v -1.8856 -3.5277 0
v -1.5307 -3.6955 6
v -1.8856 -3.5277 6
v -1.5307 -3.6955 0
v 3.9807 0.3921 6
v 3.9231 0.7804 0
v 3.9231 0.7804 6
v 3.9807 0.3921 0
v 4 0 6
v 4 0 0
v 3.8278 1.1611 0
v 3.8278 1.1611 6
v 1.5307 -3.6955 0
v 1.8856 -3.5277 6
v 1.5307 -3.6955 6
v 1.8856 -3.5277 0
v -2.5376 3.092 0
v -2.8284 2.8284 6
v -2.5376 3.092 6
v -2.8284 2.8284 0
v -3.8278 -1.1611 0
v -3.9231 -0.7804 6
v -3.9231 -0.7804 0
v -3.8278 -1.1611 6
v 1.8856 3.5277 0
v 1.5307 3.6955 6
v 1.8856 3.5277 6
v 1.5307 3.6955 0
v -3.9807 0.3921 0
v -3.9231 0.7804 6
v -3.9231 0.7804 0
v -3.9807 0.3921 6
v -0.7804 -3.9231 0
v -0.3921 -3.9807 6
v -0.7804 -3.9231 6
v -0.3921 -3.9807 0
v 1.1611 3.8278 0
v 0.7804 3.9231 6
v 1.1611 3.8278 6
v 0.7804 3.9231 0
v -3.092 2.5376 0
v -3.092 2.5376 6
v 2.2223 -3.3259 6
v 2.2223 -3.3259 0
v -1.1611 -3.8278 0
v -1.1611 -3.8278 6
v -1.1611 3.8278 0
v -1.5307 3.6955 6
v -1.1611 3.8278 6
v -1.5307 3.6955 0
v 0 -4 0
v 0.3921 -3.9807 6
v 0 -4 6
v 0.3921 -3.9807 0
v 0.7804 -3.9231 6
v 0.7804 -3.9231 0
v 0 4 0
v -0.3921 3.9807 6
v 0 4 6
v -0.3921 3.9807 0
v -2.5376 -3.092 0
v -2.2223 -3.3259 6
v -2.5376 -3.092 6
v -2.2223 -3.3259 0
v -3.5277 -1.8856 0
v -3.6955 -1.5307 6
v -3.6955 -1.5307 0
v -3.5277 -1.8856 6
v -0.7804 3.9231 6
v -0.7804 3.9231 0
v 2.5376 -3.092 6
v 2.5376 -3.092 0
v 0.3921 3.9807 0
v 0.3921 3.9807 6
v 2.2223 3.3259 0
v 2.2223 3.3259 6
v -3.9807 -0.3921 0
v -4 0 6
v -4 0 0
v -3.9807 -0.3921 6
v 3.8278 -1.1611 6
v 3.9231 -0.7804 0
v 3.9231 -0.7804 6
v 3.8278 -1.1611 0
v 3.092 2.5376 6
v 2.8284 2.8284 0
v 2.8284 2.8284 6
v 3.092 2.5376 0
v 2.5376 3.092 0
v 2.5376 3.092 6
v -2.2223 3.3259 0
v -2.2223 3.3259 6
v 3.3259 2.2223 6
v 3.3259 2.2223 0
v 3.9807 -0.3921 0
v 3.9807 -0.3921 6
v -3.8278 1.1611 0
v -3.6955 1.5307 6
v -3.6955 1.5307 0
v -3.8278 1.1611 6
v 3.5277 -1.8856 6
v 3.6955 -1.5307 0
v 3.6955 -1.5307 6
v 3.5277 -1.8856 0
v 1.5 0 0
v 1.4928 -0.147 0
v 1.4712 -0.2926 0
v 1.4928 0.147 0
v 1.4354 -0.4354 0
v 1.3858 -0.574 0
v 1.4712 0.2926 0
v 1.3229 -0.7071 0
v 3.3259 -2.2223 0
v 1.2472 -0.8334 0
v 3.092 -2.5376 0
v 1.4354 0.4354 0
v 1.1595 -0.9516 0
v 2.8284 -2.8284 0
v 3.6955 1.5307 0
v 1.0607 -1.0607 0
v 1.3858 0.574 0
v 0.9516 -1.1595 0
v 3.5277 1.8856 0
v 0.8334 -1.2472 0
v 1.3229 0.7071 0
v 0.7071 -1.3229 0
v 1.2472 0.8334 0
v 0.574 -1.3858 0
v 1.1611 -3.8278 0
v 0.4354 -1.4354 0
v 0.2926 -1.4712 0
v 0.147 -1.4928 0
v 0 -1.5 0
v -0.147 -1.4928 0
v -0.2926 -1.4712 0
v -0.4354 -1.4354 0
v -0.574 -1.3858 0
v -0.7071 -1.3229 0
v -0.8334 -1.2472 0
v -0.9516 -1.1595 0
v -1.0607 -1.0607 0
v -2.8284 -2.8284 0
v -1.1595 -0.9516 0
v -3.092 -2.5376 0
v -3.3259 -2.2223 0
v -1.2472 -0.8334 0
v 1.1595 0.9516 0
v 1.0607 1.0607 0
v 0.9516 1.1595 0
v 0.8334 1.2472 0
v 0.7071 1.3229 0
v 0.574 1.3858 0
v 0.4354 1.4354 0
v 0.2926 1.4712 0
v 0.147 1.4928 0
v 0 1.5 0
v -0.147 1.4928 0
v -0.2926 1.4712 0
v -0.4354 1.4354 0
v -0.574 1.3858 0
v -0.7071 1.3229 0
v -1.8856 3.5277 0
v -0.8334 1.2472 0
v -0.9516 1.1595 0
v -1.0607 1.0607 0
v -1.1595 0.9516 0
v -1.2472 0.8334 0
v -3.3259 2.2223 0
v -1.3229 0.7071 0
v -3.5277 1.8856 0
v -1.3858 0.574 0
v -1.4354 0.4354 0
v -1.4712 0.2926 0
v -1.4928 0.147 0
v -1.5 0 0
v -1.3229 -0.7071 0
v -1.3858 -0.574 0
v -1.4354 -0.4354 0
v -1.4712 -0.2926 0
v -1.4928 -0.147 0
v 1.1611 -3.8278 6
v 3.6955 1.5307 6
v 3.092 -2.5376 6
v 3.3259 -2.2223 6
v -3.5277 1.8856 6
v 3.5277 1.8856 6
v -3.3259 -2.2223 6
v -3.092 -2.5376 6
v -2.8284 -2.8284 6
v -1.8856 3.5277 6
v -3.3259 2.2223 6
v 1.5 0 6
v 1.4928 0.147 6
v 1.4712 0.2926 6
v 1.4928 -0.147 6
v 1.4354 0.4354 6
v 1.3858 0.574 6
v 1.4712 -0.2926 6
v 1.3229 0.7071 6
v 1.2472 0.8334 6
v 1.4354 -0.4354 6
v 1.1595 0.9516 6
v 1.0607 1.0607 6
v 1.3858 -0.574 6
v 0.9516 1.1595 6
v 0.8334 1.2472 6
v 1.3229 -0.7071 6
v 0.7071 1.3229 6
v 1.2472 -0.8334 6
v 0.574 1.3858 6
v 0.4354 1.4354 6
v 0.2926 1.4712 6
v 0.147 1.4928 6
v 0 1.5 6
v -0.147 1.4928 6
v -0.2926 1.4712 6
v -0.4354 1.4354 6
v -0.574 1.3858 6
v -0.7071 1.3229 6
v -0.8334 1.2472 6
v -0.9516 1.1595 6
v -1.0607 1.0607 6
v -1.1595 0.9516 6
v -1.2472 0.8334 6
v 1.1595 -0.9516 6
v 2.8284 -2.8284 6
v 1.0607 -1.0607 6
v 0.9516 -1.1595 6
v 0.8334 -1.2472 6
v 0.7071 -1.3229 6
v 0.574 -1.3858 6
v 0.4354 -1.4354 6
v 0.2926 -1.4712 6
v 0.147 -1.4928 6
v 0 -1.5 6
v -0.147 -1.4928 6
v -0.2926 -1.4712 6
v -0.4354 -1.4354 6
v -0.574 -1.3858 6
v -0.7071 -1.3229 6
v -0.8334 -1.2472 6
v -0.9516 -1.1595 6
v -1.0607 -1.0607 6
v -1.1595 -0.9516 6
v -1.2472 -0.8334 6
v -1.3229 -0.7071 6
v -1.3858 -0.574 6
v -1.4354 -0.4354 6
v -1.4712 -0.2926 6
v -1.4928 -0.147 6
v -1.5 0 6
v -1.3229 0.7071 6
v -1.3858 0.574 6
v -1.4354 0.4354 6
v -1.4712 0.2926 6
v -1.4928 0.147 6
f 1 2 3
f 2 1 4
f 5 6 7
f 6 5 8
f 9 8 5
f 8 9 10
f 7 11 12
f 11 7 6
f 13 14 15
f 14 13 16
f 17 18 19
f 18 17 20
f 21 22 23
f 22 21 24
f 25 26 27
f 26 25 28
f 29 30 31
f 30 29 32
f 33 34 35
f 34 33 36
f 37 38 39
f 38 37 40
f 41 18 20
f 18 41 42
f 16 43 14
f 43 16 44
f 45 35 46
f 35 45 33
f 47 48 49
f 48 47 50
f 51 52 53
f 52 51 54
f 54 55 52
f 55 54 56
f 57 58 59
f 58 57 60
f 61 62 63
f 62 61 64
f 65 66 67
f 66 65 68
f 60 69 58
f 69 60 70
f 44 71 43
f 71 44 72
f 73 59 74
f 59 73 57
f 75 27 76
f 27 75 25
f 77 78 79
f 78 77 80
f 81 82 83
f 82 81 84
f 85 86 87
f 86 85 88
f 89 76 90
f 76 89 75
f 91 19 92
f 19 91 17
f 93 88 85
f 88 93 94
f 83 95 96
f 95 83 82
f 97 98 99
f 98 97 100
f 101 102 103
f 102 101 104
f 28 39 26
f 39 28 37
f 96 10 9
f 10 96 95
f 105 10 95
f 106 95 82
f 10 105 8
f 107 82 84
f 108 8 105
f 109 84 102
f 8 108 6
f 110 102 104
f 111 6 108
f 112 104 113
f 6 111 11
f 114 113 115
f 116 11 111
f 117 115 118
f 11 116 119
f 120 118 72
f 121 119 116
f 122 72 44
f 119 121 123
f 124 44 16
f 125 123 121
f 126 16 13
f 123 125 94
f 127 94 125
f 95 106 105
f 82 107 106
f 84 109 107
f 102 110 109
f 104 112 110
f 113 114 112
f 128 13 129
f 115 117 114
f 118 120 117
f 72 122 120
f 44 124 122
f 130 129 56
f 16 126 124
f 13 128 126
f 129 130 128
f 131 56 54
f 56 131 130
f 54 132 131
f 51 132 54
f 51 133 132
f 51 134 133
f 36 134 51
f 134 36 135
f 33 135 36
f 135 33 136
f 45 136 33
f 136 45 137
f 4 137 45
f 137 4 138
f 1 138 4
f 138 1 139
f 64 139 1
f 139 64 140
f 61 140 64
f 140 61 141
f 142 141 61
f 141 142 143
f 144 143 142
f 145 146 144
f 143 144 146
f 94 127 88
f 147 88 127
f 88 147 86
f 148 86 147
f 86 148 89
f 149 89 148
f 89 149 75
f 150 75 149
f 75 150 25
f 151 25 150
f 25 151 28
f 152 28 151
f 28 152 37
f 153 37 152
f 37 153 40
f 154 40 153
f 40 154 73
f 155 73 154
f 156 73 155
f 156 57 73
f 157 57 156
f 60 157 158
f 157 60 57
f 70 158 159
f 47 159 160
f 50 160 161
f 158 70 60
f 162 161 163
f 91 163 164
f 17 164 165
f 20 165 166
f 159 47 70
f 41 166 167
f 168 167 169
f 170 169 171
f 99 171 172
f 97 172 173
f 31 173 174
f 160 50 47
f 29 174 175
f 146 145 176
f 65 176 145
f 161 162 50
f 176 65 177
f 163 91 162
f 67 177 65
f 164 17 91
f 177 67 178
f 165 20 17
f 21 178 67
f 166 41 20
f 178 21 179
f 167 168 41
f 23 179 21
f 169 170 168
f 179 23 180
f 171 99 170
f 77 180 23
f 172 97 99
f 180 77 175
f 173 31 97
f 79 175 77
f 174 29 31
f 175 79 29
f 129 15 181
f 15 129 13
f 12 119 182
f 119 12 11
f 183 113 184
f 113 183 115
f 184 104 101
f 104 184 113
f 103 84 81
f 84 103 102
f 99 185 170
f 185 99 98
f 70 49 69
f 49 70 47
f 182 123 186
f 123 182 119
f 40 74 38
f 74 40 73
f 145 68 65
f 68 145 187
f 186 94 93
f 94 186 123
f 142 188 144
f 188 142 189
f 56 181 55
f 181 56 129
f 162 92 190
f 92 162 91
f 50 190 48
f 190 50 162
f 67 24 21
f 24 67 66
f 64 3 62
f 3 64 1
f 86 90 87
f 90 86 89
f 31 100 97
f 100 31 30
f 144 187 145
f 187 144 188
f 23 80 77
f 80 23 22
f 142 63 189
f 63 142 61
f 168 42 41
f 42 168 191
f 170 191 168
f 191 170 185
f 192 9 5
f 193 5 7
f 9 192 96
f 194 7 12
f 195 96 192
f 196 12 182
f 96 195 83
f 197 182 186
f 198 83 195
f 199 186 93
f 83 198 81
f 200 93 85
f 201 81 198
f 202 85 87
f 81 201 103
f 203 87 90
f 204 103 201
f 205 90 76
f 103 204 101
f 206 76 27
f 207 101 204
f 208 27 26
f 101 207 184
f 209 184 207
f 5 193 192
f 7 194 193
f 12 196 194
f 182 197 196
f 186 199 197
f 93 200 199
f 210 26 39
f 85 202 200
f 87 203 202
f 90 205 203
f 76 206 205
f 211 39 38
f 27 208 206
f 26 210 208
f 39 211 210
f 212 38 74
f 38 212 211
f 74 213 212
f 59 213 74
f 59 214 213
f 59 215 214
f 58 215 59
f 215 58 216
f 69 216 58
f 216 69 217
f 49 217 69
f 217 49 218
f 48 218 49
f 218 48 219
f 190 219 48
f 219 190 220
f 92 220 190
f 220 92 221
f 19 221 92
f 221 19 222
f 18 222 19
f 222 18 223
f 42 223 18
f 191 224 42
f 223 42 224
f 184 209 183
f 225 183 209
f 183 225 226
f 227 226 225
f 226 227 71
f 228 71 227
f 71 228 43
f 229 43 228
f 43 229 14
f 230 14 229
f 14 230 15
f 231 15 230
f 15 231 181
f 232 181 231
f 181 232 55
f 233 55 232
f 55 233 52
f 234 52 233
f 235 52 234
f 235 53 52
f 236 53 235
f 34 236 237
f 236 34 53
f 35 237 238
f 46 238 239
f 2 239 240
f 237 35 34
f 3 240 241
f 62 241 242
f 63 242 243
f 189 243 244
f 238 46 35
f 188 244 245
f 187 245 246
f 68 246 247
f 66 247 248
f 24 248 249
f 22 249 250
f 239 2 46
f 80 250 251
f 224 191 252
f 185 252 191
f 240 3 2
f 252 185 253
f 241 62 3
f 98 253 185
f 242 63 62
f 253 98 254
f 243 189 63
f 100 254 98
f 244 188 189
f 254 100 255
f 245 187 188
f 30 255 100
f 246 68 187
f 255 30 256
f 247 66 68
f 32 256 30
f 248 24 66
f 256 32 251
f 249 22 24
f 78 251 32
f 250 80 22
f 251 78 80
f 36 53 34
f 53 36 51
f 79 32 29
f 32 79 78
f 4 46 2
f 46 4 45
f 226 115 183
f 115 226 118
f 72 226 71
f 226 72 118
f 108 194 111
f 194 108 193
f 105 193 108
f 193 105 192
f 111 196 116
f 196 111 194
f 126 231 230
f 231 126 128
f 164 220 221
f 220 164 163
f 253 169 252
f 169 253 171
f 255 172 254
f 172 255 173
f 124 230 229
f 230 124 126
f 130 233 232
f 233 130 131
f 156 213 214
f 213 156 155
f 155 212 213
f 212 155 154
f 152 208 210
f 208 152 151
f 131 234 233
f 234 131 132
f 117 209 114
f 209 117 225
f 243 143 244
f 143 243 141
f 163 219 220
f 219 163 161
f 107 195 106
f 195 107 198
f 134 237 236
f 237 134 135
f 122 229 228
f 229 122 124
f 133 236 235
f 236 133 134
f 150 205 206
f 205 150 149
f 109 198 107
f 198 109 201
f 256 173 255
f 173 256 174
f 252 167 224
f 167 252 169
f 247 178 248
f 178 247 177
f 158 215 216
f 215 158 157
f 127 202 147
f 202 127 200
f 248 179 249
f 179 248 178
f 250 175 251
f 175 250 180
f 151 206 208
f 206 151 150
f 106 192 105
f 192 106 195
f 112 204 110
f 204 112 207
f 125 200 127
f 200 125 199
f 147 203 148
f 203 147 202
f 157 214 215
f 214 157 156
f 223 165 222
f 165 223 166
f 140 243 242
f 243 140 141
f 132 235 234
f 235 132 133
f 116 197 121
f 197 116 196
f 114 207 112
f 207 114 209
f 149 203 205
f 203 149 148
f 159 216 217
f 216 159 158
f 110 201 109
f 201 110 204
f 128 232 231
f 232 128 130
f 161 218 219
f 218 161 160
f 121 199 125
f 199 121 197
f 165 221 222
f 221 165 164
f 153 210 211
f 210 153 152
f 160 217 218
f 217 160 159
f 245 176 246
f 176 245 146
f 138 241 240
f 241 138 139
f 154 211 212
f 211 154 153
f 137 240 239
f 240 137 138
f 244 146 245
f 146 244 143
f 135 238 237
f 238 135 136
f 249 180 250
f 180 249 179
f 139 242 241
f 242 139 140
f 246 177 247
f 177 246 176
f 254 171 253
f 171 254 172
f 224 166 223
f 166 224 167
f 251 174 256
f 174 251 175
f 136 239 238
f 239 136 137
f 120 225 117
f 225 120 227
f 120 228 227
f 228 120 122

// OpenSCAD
module threaded_heat_set_insert() {
    difference() {
        cylinder(d=8.0, h=6.0, $fn=64);
        translate([0, 0, -1]) {
            cylinder(d=3.0, h=8.0, $fn=64);
        }
    }
}

threaded_heat_set_insert();
